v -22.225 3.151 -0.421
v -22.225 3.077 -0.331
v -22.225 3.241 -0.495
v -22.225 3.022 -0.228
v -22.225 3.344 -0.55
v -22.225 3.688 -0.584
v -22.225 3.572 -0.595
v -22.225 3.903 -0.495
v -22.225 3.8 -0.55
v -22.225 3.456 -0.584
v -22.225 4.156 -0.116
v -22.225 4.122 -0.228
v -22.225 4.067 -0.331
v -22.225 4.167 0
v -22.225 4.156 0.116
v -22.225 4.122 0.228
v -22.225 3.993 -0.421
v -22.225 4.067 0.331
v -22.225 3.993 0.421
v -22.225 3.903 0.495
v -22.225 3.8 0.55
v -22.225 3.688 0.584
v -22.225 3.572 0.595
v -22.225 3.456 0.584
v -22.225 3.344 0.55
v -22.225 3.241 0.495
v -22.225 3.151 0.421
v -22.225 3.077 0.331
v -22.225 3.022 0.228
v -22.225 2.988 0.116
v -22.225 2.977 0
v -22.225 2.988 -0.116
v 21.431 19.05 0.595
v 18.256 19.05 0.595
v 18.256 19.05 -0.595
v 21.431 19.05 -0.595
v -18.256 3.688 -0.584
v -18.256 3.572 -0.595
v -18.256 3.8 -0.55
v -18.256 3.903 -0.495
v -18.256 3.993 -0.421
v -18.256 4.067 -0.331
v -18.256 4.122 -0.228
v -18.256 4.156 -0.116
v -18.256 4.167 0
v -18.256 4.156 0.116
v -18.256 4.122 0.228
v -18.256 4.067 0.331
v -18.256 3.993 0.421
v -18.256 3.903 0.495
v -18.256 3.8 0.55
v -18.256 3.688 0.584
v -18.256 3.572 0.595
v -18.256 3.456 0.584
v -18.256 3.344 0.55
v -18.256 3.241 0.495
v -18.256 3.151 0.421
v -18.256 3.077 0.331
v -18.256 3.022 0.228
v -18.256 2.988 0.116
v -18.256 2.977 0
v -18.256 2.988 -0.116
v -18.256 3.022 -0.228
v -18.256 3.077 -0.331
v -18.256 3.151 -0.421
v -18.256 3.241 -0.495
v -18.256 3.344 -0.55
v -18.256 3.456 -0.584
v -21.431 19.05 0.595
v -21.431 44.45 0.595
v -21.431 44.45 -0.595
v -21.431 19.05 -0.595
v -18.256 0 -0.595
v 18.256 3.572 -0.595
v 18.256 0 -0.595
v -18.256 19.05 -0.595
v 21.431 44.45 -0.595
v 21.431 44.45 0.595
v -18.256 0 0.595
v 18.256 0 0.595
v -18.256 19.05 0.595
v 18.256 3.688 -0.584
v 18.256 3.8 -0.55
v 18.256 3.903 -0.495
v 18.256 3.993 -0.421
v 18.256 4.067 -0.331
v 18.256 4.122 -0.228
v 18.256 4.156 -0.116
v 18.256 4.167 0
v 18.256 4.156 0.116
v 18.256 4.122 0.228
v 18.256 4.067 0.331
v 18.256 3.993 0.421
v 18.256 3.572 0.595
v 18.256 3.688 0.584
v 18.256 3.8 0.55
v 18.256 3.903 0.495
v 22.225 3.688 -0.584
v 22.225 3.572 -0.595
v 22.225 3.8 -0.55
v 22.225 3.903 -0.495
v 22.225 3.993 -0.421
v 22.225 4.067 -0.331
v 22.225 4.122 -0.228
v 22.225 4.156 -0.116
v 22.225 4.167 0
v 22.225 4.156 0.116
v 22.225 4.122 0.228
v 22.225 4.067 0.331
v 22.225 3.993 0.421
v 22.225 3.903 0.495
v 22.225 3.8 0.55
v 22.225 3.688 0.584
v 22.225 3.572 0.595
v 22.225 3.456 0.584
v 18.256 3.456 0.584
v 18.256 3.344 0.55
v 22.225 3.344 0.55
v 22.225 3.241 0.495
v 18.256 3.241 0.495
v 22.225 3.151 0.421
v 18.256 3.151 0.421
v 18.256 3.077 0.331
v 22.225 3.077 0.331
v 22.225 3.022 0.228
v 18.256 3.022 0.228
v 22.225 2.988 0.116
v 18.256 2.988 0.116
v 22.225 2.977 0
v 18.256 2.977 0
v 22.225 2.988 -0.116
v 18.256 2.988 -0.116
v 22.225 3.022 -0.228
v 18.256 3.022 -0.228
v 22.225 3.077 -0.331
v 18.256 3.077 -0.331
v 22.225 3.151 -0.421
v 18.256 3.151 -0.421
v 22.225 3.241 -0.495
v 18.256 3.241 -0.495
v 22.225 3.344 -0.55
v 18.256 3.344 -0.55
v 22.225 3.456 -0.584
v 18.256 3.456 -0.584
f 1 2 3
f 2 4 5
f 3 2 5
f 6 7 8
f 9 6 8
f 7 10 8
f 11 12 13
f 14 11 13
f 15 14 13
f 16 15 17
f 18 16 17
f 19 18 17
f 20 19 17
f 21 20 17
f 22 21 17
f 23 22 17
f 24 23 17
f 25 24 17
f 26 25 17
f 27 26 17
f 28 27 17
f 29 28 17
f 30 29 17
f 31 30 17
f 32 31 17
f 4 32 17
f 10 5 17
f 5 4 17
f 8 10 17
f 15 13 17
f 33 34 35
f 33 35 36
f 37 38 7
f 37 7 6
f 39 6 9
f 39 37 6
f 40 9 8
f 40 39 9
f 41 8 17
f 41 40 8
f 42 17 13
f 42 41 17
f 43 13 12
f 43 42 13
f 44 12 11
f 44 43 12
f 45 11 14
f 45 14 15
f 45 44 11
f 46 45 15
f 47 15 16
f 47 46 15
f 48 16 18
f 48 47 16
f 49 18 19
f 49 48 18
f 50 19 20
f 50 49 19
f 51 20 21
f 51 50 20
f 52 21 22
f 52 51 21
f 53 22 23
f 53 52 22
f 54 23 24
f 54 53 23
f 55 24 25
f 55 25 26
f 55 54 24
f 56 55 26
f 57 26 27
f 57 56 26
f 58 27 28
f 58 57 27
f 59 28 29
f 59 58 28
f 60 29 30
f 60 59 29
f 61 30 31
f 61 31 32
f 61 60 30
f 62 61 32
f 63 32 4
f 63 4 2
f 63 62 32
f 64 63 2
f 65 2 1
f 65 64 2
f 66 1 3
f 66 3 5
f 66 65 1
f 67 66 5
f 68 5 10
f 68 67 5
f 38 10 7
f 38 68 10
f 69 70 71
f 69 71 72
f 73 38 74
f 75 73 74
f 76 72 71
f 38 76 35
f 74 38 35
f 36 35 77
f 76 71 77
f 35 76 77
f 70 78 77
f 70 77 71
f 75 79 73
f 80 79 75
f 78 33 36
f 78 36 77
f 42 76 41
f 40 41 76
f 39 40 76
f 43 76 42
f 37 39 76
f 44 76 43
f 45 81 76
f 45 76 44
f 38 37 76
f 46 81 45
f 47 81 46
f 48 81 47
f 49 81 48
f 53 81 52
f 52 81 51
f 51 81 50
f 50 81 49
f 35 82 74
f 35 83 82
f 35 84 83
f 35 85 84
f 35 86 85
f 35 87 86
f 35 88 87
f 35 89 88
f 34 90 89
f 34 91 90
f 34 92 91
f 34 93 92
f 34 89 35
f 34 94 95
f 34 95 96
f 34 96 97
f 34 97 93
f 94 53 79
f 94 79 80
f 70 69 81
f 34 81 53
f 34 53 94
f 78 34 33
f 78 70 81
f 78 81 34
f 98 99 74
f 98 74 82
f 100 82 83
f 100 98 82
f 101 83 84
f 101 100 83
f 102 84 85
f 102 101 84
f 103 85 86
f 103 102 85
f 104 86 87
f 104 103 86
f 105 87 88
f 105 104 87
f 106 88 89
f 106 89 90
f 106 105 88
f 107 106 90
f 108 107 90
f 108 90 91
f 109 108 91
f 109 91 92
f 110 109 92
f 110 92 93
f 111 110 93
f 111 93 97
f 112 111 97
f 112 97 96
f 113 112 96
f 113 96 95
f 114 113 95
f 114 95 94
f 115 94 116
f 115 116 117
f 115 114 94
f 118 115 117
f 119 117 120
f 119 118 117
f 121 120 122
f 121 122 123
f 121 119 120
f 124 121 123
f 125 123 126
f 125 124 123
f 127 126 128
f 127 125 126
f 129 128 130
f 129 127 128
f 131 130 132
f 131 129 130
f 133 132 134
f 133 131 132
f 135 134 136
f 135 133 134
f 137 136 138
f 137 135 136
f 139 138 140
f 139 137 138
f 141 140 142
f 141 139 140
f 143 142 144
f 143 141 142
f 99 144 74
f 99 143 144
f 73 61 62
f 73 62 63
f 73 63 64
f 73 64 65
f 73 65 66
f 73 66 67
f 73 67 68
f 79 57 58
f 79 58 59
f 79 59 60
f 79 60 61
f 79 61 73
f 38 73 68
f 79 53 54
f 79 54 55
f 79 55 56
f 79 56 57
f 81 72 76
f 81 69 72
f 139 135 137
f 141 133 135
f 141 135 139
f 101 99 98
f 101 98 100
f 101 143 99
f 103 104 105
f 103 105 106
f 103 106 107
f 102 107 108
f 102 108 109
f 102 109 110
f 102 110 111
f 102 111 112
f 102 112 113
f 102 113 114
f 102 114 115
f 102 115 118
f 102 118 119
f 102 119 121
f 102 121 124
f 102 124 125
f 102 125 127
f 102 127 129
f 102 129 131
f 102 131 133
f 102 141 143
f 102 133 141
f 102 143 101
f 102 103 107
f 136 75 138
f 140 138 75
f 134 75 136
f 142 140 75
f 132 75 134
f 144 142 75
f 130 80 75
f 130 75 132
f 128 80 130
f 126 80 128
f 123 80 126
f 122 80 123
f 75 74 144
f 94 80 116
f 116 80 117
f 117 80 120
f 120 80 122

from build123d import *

# Parameters (mm, degrees)
BOSS_EXTRUDE1_DEPTH = 0.5953125
SKETCH2_R           = 0.5953125
BOSS_EXTRUDE2_DEPTH = 22.225


with BuildPart() as part:
    # Sketch1 → Boss-Extrude1 (new, symmetric)
    with BuildSketch(Plane.XY):
        Polygon((-18.25625, 0), (18.25625, 0), (18.25625, 19.05), (21.43125, 19.05), (21.43125, 44.45), (-21.43125, 44.45), (-21.43125, 19.05), (-18.25625, 19.05), align=None)
    extrude(amount=BOSS_EXTRUDE1_DEPTH, both=True)

    # Sketch2 → Boss-Extrude2 (add, symmetric)
    with BuildSketch(Plane(origin=(0, 0, 0), x_dir=(0, 0, -1), z_dir=(1, 0, 0))):
        with Locations((0, 3.571875)):
            Circle(SKETCH2_R)
    extrude(amount=BOSS_EXTRUDE2_DEPTH, both=True)


solid = part.part
